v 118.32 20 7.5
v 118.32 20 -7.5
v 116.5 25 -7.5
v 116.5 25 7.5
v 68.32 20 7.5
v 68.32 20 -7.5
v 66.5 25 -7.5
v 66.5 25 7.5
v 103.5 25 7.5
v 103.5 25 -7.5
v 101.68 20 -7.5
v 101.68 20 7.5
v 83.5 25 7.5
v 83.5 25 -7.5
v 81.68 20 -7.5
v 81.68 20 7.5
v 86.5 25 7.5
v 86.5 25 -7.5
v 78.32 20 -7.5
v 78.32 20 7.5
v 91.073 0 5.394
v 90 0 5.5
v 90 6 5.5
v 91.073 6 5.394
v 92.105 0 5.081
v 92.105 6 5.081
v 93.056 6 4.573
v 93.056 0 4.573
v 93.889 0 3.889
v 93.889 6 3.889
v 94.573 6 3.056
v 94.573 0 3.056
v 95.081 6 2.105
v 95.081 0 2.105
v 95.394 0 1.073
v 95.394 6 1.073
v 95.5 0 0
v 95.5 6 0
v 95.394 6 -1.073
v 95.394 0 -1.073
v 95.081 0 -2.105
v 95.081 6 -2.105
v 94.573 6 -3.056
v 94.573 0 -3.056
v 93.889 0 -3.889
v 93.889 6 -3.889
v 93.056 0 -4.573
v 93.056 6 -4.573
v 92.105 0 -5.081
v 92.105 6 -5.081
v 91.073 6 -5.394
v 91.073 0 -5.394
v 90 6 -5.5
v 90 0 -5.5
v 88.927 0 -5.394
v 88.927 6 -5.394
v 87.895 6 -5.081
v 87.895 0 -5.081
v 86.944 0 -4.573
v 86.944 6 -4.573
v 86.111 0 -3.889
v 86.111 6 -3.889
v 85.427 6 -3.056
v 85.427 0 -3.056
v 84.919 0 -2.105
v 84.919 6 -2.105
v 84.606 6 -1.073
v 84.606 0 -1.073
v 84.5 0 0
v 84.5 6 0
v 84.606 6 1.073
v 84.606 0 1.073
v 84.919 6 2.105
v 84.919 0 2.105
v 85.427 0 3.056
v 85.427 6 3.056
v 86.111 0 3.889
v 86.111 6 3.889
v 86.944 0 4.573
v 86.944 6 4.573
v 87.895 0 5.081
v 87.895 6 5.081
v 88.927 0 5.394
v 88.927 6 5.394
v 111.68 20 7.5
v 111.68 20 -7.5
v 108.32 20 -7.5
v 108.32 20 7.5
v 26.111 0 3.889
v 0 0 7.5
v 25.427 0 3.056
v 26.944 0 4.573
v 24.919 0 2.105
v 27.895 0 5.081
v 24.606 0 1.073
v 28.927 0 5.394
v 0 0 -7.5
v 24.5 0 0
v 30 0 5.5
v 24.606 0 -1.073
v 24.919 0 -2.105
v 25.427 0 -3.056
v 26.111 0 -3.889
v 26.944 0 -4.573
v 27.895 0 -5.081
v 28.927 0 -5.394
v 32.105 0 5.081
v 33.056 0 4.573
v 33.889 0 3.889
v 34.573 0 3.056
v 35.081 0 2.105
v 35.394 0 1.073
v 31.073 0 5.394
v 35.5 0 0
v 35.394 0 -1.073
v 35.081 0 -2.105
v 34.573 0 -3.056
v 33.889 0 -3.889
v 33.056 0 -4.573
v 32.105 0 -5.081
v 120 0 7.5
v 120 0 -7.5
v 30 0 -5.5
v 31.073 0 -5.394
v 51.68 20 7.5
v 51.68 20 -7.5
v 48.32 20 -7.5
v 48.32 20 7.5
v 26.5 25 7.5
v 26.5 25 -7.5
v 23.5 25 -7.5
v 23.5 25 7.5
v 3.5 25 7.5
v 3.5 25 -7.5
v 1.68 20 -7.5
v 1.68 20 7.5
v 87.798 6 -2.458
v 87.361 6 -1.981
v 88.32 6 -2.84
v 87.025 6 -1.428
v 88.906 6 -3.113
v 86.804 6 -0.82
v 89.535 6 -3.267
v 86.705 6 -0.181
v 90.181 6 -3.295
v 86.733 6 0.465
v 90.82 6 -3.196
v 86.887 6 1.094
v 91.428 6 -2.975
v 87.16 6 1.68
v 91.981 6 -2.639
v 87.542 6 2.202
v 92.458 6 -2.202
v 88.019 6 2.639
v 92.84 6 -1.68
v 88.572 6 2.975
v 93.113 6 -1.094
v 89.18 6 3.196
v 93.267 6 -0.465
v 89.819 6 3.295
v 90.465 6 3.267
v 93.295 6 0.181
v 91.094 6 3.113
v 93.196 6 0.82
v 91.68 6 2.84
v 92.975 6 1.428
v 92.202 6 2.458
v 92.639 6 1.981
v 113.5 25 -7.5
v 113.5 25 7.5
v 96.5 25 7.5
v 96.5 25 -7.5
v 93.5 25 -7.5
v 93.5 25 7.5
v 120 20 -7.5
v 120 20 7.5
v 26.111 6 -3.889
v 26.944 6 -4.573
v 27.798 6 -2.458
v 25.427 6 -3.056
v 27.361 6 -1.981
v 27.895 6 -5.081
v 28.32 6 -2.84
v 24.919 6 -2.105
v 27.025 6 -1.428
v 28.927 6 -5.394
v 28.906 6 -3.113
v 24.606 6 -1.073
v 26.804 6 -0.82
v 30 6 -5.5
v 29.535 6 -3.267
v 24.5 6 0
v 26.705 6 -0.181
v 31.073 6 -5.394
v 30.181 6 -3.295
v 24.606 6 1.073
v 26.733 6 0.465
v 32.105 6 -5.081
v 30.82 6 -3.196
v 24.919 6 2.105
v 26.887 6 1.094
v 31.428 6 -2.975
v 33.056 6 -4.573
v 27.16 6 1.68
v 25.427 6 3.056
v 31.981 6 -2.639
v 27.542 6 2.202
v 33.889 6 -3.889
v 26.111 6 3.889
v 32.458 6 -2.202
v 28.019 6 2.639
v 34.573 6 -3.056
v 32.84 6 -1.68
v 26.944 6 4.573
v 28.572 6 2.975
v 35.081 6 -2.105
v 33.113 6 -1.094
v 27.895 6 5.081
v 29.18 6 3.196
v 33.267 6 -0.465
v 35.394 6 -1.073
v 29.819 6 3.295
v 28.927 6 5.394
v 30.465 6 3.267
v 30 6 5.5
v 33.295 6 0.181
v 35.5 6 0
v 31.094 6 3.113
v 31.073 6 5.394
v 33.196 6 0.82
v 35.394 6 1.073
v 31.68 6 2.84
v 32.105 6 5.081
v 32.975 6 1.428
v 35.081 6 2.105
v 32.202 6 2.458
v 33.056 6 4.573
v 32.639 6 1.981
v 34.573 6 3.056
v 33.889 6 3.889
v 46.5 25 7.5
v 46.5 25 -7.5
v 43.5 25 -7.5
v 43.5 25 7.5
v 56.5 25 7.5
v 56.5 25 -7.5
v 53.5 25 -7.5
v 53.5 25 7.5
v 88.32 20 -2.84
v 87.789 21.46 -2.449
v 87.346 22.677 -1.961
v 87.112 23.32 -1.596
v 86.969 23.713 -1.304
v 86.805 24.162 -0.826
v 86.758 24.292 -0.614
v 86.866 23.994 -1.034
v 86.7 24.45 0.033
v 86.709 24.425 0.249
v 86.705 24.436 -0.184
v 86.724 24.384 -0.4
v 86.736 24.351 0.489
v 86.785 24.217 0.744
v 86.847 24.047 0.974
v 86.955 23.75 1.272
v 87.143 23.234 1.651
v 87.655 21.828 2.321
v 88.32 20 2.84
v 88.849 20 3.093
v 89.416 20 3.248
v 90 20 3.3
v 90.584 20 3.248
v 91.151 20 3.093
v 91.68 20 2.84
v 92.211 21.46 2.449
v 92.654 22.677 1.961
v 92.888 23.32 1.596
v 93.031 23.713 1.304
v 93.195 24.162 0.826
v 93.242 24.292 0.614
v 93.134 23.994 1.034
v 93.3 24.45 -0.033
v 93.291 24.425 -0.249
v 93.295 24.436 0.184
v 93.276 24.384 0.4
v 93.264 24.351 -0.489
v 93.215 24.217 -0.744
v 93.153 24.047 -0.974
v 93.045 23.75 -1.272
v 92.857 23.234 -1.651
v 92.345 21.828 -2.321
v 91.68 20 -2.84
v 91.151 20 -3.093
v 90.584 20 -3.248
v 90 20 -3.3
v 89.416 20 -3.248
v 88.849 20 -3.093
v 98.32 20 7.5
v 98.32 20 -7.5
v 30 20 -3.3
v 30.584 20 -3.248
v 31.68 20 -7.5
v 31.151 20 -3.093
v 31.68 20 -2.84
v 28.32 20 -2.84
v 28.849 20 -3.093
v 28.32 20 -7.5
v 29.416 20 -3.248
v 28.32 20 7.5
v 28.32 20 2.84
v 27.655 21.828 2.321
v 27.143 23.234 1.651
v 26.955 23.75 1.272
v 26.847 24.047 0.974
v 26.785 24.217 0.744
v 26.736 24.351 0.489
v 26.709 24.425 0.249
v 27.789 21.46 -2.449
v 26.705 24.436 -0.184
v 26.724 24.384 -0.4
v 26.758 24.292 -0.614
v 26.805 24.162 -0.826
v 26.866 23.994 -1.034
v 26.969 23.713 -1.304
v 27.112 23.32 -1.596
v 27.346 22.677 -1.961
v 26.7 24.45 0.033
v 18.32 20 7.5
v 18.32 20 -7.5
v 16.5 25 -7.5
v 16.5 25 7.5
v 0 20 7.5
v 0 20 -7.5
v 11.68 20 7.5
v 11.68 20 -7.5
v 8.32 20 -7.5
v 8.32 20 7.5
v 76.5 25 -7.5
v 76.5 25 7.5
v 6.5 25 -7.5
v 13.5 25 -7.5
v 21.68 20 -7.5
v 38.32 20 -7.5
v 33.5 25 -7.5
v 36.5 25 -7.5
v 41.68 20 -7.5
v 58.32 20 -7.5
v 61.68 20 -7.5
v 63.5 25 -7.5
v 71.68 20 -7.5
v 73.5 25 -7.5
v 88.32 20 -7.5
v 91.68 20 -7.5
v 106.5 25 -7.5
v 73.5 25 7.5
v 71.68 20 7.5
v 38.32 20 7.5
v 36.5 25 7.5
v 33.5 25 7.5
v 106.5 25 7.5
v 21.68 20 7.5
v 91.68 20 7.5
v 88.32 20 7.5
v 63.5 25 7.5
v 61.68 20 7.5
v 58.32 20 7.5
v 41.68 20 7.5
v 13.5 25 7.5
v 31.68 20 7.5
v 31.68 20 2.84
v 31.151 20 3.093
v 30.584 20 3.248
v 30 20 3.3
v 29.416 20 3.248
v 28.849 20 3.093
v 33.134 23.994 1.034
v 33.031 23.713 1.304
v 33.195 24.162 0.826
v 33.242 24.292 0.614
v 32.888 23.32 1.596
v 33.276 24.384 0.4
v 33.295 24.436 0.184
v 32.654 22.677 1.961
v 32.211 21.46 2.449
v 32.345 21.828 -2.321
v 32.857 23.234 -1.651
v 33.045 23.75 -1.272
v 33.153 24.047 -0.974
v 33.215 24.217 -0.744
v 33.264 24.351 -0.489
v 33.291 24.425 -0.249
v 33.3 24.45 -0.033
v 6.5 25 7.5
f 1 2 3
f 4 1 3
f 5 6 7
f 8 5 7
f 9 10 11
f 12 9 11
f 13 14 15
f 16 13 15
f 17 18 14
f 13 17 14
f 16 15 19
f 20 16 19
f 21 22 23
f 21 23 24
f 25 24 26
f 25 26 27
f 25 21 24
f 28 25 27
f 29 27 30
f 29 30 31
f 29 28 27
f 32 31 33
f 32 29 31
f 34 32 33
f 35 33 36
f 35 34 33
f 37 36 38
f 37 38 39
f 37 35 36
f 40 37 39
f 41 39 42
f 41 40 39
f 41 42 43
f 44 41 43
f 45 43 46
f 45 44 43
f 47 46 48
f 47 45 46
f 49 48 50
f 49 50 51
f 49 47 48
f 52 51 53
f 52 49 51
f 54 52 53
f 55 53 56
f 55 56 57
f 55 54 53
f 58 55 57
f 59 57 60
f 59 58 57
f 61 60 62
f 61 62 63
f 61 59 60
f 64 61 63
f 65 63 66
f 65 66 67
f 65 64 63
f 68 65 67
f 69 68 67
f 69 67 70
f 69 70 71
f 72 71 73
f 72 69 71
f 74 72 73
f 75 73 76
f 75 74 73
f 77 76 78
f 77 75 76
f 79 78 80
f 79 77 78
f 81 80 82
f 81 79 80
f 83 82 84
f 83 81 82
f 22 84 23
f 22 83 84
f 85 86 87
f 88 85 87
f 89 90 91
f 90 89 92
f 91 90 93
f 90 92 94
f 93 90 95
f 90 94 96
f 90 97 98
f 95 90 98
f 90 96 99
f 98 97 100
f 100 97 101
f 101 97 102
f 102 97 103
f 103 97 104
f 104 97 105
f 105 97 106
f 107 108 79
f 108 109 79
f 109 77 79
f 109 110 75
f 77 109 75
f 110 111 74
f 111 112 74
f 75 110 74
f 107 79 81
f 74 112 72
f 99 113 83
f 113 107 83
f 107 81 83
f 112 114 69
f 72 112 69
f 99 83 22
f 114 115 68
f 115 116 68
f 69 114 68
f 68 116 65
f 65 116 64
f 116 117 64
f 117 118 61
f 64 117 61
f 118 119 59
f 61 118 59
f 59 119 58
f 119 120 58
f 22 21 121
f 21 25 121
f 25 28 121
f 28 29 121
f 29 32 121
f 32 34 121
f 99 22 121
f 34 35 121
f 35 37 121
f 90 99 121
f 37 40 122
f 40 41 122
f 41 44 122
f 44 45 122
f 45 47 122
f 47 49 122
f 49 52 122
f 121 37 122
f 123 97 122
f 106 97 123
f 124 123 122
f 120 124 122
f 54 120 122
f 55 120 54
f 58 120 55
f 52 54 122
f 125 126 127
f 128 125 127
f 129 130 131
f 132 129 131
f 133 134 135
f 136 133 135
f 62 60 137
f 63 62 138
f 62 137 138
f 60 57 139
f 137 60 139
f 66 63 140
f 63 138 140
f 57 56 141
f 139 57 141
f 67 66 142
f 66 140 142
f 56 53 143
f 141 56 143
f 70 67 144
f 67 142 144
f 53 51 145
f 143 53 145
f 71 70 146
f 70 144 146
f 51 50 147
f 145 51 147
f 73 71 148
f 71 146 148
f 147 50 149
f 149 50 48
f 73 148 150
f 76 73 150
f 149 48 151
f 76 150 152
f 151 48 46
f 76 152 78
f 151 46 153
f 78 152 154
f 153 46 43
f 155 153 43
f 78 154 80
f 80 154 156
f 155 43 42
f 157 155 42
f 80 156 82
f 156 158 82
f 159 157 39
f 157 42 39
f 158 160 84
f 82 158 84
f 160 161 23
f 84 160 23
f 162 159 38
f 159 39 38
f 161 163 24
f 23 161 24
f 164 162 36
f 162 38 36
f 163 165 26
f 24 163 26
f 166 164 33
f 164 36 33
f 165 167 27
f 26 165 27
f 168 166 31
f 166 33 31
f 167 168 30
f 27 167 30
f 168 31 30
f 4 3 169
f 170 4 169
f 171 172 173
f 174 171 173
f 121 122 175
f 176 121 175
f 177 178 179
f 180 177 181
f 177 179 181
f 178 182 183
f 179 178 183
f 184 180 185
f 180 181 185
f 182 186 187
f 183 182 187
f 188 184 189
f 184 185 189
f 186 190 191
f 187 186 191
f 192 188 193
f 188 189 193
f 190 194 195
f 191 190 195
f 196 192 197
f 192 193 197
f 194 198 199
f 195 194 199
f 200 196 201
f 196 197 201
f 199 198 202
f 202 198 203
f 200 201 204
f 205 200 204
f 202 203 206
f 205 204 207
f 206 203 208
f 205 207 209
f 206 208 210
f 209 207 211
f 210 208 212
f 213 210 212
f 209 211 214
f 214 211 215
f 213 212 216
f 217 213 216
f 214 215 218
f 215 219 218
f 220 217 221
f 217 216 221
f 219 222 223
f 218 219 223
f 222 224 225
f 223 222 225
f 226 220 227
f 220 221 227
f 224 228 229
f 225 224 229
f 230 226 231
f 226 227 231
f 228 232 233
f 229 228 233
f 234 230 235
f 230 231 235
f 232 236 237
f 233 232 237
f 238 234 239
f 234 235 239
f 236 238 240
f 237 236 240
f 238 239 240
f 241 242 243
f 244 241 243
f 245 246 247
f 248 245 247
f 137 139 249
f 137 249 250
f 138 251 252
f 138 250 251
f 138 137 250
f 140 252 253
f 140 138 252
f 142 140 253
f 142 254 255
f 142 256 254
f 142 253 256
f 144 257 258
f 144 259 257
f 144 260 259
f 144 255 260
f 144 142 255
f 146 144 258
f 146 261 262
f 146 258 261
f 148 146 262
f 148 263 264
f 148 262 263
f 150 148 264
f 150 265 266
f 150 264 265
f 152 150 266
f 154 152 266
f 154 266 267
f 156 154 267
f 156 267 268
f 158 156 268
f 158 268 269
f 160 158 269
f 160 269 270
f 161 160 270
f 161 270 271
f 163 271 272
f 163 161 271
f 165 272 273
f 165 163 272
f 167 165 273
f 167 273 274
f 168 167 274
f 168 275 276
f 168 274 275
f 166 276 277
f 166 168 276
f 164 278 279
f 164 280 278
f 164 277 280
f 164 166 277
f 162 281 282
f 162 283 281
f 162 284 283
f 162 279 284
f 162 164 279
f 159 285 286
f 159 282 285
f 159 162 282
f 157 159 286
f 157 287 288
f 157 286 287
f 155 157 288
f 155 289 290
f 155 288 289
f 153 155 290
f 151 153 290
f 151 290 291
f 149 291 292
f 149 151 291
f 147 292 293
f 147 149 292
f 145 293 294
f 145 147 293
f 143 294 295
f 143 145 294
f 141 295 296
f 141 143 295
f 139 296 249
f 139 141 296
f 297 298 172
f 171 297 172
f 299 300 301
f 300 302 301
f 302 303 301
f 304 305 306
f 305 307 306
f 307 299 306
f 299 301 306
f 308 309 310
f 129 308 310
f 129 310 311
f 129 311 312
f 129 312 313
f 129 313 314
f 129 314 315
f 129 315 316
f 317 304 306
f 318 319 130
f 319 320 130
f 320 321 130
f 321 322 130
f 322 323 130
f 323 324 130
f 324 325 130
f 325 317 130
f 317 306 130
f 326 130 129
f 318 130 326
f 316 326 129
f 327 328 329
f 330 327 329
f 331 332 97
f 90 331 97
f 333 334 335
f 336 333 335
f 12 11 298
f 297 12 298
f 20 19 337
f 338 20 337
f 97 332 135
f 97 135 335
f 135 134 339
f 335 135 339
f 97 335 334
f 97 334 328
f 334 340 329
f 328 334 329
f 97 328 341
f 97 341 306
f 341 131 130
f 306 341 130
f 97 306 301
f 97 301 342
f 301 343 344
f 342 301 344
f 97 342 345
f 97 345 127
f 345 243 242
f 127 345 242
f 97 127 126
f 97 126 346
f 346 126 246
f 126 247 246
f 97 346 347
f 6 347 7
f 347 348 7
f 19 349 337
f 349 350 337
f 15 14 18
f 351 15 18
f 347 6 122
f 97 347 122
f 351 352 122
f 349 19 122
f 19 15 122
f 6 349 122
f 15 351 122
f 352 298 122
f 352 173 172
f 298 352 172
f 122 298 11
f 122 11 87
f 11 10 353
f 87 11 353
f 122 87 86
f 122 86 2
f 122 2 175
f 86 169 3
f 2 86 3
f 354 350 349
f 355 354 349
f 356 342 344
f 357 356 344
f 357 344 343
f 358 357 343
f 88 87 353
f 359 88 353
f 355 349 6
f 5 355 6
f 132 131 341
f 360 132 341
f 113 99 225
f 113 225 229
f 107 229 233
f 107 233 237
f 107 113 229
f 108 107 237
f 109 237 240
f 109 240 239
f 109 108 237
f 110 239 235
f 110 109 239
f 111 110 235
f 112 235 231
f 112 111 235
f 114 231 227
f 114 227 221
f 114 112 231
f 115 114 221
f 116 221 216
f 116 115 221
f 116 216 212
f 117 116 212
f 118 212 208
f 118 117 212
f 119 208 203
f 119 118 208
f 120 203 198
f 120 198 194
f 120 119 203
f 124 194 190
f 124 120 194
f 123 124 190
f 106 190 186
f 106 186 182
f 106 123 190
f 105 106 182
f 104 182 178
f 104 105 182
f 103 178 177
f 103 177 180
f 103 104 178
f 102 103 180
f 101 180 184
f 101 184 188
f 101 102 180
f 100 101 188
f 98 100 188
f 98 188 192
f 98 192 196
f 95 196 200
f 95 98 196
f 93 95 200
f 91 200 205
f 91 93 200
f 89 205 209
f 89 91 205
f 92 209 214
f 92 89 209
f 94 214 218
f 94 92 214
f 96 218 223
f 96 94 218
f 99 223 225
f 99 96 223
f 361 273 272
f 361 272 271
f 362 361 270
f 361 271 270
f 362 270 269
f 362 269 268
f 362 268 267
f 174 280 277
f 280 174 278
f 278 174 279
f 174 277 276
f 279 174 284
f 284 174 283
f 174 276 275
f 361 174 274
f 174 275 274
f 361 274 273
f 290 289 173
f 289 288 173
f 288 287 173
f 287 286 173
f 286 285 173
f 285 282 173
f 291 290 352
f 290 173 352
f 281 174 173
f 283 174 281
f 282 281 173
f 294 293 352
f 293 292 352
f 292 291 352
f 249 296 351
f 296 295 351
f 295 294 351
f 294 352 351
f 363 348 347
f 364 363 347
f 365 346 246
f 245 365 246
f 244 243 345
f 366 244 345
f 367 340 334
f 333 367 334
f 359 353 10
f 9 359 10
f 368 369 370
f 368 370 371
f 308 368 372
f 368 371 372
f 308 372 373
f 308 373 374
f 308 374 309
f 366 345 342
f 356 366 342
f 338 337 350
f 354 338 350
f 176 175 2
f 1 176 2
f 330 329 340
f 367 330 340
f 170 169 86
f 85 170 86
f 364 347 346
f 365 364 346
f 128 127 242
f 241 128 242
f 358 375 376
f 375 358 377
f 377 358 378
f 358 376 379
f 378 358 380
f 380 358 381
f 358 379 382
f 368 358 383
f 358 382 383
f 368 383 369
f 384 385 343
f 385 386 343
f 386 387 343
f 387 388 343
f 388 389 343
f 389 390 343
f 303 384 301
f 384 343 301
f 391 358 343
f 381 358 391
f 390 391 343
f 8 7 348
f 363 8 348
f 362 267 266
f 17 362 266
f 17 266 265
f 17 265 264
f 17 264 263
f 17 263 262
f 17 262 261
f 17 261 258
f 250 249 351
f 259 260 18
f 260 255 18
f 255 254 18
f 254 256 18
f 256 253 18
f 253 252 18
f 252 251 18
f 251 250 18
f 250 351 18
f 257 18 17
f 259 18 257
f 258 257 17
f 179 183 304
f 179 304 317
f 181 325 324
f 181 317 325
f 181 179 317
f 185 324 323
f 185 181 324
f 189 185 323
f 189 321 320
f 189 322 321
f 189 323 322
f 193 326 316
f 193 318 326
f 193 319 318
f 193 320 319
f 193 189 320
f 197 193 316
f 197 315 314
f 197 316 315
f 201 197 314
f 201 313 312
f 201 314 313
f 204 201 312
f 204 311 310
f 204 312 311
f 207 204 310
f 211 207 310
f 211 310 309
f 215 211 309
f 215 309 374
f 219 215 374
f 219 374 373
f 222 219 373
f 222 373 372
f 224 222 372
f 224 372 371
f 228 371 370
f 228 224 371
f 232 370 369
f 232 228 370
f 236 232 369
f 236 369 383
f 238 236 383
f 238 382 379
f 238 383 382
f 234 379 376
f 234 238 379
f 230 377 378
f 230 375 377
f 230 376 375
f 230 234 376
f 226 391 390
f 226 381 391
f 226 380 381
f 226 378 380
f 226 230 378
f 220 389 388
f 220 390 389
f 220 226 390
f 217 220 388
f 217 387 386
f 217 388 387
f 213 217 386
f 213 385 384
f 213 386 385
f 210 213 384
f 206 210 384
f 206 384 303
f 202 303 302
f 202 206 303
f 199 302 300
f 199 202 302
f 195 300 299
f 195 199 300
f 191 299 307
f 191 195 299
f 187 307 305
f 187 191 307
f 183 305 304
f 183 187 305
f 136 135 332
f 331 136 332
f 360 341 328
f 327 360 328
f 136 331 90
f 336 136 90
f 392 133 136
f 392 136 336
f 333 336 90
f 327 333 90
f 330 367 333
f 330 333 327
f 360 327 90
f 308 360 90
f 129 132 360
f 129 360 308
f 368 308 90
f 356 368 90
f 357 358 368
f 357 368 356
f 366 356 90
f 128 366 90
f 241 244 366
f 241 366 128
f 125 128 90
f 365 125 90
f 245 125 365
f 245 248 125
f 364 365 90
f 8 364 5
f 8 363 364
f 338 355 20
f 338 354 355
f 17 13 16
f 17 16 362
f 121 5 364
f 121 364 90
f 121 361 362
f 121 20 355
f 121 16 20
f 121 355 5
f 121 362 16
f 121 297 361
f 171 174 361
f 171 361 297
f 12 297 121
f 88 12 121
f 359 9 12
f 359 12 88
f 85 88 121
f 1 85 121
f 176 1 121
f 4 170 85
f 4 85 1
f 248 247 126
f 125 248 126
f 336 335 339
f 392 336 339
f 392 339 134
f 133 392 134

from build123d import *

# Parameters (mm, degrees)
EXTRUDE_START       = -7.5
EXTRUDE_1_DEPTH     = 15
SKETCH_2_R          = 5.5
CUT_EXTRUDE_1_DEPTH = 6
SKETCH_3_R          = 3.3
CUT_EXTRUDE_2_DEPTH = 123.805740908


# Read off the part's stored shape, not the designer's step: 凸台-拉伸1
with BuildPart() as part:
    # 凸台-拉伸1 outline → 凸台-拉伸1 (new body)
    with BuildSketch(Plane.XY.offset(EXTRUDE_START)):
        Polygon((0, 0), (120, 0), (120, 20), (118.319851, 20), (116.5, 25), (113.5, 25), (111.680149, 20), (108.319851, 20), (106.5, 25), (103.5, 25), (101.680149, 20), (98.319851, 20), (96.5, 25), (93.5, 25), (91.680149, 20), (88.319851, 20), (86.5, 25), (83.5, 25), (81.680149, 20), (78.319851, 20), (76.5, 25), (73.5, 25), (71.680149, 20), (68.319851, 20), (66.5, 25), (63.5, 25), (61.680149, 20), (58.319851, 20), (56.5, 25), (53.5, 25), (51.680149, 20), (48.319851, 20), (46.5, 25), (43.5, 25), (41.680149, 20), (38.319851, 20), (36.5, 25), (33.5, 25), (31.680149, 20), (28.319851, 20), (26.5, 25), (23.5, 25), (21.680149, 20), (18.319851, 20), (16.5, 25), (13.5, 25), (11.680149, 20), (8.319851, 20), (6.5, 25), (3.5, 25), (1.680149, 20), (0, 20), align=None)
    extrude(amount=EXTRUDE_1_DEPTH)

    # 草图2 → 切除-拉伸1 (cut)
    with BuildSketch(Plane(origin=(0, 0, 0), x_dir=(1, 0, 0), z_dir=(0, 1, 0))):
        with Locations(Location((30, 0, 0), (0, 0, 270))):
            Circle(SKETCH_2_R)
        with Locations(Location((90, 0, 0), (0, 0, 270))):
            Circle(SKETCH_2_R)
    extrude(amount=CUT_EXTRUDE_1_DEPTH, mode=Mode.SUBTRACT)

    # 草图3 → 切除-拉伸2 (cut, through all)
    with BuildSketch(Plane(origin=(0, 0, 0), x_dir=(1, 0, 0), z_dir=(0, 1, 0))):
        with Locations(Location((30, 0, 0), (0, 0, 120.606300293))):
            Circle(SKETCH_3_R)
        with Locations(Location((90, 0, 0), (0, 0, 120.606300293))):
            Circle(SKETCH_3_R)
    extrude(amount=CUT_EXTRUDE_2_DEPTH, mode=Mode.SUBTRACT)


solid = part.part
